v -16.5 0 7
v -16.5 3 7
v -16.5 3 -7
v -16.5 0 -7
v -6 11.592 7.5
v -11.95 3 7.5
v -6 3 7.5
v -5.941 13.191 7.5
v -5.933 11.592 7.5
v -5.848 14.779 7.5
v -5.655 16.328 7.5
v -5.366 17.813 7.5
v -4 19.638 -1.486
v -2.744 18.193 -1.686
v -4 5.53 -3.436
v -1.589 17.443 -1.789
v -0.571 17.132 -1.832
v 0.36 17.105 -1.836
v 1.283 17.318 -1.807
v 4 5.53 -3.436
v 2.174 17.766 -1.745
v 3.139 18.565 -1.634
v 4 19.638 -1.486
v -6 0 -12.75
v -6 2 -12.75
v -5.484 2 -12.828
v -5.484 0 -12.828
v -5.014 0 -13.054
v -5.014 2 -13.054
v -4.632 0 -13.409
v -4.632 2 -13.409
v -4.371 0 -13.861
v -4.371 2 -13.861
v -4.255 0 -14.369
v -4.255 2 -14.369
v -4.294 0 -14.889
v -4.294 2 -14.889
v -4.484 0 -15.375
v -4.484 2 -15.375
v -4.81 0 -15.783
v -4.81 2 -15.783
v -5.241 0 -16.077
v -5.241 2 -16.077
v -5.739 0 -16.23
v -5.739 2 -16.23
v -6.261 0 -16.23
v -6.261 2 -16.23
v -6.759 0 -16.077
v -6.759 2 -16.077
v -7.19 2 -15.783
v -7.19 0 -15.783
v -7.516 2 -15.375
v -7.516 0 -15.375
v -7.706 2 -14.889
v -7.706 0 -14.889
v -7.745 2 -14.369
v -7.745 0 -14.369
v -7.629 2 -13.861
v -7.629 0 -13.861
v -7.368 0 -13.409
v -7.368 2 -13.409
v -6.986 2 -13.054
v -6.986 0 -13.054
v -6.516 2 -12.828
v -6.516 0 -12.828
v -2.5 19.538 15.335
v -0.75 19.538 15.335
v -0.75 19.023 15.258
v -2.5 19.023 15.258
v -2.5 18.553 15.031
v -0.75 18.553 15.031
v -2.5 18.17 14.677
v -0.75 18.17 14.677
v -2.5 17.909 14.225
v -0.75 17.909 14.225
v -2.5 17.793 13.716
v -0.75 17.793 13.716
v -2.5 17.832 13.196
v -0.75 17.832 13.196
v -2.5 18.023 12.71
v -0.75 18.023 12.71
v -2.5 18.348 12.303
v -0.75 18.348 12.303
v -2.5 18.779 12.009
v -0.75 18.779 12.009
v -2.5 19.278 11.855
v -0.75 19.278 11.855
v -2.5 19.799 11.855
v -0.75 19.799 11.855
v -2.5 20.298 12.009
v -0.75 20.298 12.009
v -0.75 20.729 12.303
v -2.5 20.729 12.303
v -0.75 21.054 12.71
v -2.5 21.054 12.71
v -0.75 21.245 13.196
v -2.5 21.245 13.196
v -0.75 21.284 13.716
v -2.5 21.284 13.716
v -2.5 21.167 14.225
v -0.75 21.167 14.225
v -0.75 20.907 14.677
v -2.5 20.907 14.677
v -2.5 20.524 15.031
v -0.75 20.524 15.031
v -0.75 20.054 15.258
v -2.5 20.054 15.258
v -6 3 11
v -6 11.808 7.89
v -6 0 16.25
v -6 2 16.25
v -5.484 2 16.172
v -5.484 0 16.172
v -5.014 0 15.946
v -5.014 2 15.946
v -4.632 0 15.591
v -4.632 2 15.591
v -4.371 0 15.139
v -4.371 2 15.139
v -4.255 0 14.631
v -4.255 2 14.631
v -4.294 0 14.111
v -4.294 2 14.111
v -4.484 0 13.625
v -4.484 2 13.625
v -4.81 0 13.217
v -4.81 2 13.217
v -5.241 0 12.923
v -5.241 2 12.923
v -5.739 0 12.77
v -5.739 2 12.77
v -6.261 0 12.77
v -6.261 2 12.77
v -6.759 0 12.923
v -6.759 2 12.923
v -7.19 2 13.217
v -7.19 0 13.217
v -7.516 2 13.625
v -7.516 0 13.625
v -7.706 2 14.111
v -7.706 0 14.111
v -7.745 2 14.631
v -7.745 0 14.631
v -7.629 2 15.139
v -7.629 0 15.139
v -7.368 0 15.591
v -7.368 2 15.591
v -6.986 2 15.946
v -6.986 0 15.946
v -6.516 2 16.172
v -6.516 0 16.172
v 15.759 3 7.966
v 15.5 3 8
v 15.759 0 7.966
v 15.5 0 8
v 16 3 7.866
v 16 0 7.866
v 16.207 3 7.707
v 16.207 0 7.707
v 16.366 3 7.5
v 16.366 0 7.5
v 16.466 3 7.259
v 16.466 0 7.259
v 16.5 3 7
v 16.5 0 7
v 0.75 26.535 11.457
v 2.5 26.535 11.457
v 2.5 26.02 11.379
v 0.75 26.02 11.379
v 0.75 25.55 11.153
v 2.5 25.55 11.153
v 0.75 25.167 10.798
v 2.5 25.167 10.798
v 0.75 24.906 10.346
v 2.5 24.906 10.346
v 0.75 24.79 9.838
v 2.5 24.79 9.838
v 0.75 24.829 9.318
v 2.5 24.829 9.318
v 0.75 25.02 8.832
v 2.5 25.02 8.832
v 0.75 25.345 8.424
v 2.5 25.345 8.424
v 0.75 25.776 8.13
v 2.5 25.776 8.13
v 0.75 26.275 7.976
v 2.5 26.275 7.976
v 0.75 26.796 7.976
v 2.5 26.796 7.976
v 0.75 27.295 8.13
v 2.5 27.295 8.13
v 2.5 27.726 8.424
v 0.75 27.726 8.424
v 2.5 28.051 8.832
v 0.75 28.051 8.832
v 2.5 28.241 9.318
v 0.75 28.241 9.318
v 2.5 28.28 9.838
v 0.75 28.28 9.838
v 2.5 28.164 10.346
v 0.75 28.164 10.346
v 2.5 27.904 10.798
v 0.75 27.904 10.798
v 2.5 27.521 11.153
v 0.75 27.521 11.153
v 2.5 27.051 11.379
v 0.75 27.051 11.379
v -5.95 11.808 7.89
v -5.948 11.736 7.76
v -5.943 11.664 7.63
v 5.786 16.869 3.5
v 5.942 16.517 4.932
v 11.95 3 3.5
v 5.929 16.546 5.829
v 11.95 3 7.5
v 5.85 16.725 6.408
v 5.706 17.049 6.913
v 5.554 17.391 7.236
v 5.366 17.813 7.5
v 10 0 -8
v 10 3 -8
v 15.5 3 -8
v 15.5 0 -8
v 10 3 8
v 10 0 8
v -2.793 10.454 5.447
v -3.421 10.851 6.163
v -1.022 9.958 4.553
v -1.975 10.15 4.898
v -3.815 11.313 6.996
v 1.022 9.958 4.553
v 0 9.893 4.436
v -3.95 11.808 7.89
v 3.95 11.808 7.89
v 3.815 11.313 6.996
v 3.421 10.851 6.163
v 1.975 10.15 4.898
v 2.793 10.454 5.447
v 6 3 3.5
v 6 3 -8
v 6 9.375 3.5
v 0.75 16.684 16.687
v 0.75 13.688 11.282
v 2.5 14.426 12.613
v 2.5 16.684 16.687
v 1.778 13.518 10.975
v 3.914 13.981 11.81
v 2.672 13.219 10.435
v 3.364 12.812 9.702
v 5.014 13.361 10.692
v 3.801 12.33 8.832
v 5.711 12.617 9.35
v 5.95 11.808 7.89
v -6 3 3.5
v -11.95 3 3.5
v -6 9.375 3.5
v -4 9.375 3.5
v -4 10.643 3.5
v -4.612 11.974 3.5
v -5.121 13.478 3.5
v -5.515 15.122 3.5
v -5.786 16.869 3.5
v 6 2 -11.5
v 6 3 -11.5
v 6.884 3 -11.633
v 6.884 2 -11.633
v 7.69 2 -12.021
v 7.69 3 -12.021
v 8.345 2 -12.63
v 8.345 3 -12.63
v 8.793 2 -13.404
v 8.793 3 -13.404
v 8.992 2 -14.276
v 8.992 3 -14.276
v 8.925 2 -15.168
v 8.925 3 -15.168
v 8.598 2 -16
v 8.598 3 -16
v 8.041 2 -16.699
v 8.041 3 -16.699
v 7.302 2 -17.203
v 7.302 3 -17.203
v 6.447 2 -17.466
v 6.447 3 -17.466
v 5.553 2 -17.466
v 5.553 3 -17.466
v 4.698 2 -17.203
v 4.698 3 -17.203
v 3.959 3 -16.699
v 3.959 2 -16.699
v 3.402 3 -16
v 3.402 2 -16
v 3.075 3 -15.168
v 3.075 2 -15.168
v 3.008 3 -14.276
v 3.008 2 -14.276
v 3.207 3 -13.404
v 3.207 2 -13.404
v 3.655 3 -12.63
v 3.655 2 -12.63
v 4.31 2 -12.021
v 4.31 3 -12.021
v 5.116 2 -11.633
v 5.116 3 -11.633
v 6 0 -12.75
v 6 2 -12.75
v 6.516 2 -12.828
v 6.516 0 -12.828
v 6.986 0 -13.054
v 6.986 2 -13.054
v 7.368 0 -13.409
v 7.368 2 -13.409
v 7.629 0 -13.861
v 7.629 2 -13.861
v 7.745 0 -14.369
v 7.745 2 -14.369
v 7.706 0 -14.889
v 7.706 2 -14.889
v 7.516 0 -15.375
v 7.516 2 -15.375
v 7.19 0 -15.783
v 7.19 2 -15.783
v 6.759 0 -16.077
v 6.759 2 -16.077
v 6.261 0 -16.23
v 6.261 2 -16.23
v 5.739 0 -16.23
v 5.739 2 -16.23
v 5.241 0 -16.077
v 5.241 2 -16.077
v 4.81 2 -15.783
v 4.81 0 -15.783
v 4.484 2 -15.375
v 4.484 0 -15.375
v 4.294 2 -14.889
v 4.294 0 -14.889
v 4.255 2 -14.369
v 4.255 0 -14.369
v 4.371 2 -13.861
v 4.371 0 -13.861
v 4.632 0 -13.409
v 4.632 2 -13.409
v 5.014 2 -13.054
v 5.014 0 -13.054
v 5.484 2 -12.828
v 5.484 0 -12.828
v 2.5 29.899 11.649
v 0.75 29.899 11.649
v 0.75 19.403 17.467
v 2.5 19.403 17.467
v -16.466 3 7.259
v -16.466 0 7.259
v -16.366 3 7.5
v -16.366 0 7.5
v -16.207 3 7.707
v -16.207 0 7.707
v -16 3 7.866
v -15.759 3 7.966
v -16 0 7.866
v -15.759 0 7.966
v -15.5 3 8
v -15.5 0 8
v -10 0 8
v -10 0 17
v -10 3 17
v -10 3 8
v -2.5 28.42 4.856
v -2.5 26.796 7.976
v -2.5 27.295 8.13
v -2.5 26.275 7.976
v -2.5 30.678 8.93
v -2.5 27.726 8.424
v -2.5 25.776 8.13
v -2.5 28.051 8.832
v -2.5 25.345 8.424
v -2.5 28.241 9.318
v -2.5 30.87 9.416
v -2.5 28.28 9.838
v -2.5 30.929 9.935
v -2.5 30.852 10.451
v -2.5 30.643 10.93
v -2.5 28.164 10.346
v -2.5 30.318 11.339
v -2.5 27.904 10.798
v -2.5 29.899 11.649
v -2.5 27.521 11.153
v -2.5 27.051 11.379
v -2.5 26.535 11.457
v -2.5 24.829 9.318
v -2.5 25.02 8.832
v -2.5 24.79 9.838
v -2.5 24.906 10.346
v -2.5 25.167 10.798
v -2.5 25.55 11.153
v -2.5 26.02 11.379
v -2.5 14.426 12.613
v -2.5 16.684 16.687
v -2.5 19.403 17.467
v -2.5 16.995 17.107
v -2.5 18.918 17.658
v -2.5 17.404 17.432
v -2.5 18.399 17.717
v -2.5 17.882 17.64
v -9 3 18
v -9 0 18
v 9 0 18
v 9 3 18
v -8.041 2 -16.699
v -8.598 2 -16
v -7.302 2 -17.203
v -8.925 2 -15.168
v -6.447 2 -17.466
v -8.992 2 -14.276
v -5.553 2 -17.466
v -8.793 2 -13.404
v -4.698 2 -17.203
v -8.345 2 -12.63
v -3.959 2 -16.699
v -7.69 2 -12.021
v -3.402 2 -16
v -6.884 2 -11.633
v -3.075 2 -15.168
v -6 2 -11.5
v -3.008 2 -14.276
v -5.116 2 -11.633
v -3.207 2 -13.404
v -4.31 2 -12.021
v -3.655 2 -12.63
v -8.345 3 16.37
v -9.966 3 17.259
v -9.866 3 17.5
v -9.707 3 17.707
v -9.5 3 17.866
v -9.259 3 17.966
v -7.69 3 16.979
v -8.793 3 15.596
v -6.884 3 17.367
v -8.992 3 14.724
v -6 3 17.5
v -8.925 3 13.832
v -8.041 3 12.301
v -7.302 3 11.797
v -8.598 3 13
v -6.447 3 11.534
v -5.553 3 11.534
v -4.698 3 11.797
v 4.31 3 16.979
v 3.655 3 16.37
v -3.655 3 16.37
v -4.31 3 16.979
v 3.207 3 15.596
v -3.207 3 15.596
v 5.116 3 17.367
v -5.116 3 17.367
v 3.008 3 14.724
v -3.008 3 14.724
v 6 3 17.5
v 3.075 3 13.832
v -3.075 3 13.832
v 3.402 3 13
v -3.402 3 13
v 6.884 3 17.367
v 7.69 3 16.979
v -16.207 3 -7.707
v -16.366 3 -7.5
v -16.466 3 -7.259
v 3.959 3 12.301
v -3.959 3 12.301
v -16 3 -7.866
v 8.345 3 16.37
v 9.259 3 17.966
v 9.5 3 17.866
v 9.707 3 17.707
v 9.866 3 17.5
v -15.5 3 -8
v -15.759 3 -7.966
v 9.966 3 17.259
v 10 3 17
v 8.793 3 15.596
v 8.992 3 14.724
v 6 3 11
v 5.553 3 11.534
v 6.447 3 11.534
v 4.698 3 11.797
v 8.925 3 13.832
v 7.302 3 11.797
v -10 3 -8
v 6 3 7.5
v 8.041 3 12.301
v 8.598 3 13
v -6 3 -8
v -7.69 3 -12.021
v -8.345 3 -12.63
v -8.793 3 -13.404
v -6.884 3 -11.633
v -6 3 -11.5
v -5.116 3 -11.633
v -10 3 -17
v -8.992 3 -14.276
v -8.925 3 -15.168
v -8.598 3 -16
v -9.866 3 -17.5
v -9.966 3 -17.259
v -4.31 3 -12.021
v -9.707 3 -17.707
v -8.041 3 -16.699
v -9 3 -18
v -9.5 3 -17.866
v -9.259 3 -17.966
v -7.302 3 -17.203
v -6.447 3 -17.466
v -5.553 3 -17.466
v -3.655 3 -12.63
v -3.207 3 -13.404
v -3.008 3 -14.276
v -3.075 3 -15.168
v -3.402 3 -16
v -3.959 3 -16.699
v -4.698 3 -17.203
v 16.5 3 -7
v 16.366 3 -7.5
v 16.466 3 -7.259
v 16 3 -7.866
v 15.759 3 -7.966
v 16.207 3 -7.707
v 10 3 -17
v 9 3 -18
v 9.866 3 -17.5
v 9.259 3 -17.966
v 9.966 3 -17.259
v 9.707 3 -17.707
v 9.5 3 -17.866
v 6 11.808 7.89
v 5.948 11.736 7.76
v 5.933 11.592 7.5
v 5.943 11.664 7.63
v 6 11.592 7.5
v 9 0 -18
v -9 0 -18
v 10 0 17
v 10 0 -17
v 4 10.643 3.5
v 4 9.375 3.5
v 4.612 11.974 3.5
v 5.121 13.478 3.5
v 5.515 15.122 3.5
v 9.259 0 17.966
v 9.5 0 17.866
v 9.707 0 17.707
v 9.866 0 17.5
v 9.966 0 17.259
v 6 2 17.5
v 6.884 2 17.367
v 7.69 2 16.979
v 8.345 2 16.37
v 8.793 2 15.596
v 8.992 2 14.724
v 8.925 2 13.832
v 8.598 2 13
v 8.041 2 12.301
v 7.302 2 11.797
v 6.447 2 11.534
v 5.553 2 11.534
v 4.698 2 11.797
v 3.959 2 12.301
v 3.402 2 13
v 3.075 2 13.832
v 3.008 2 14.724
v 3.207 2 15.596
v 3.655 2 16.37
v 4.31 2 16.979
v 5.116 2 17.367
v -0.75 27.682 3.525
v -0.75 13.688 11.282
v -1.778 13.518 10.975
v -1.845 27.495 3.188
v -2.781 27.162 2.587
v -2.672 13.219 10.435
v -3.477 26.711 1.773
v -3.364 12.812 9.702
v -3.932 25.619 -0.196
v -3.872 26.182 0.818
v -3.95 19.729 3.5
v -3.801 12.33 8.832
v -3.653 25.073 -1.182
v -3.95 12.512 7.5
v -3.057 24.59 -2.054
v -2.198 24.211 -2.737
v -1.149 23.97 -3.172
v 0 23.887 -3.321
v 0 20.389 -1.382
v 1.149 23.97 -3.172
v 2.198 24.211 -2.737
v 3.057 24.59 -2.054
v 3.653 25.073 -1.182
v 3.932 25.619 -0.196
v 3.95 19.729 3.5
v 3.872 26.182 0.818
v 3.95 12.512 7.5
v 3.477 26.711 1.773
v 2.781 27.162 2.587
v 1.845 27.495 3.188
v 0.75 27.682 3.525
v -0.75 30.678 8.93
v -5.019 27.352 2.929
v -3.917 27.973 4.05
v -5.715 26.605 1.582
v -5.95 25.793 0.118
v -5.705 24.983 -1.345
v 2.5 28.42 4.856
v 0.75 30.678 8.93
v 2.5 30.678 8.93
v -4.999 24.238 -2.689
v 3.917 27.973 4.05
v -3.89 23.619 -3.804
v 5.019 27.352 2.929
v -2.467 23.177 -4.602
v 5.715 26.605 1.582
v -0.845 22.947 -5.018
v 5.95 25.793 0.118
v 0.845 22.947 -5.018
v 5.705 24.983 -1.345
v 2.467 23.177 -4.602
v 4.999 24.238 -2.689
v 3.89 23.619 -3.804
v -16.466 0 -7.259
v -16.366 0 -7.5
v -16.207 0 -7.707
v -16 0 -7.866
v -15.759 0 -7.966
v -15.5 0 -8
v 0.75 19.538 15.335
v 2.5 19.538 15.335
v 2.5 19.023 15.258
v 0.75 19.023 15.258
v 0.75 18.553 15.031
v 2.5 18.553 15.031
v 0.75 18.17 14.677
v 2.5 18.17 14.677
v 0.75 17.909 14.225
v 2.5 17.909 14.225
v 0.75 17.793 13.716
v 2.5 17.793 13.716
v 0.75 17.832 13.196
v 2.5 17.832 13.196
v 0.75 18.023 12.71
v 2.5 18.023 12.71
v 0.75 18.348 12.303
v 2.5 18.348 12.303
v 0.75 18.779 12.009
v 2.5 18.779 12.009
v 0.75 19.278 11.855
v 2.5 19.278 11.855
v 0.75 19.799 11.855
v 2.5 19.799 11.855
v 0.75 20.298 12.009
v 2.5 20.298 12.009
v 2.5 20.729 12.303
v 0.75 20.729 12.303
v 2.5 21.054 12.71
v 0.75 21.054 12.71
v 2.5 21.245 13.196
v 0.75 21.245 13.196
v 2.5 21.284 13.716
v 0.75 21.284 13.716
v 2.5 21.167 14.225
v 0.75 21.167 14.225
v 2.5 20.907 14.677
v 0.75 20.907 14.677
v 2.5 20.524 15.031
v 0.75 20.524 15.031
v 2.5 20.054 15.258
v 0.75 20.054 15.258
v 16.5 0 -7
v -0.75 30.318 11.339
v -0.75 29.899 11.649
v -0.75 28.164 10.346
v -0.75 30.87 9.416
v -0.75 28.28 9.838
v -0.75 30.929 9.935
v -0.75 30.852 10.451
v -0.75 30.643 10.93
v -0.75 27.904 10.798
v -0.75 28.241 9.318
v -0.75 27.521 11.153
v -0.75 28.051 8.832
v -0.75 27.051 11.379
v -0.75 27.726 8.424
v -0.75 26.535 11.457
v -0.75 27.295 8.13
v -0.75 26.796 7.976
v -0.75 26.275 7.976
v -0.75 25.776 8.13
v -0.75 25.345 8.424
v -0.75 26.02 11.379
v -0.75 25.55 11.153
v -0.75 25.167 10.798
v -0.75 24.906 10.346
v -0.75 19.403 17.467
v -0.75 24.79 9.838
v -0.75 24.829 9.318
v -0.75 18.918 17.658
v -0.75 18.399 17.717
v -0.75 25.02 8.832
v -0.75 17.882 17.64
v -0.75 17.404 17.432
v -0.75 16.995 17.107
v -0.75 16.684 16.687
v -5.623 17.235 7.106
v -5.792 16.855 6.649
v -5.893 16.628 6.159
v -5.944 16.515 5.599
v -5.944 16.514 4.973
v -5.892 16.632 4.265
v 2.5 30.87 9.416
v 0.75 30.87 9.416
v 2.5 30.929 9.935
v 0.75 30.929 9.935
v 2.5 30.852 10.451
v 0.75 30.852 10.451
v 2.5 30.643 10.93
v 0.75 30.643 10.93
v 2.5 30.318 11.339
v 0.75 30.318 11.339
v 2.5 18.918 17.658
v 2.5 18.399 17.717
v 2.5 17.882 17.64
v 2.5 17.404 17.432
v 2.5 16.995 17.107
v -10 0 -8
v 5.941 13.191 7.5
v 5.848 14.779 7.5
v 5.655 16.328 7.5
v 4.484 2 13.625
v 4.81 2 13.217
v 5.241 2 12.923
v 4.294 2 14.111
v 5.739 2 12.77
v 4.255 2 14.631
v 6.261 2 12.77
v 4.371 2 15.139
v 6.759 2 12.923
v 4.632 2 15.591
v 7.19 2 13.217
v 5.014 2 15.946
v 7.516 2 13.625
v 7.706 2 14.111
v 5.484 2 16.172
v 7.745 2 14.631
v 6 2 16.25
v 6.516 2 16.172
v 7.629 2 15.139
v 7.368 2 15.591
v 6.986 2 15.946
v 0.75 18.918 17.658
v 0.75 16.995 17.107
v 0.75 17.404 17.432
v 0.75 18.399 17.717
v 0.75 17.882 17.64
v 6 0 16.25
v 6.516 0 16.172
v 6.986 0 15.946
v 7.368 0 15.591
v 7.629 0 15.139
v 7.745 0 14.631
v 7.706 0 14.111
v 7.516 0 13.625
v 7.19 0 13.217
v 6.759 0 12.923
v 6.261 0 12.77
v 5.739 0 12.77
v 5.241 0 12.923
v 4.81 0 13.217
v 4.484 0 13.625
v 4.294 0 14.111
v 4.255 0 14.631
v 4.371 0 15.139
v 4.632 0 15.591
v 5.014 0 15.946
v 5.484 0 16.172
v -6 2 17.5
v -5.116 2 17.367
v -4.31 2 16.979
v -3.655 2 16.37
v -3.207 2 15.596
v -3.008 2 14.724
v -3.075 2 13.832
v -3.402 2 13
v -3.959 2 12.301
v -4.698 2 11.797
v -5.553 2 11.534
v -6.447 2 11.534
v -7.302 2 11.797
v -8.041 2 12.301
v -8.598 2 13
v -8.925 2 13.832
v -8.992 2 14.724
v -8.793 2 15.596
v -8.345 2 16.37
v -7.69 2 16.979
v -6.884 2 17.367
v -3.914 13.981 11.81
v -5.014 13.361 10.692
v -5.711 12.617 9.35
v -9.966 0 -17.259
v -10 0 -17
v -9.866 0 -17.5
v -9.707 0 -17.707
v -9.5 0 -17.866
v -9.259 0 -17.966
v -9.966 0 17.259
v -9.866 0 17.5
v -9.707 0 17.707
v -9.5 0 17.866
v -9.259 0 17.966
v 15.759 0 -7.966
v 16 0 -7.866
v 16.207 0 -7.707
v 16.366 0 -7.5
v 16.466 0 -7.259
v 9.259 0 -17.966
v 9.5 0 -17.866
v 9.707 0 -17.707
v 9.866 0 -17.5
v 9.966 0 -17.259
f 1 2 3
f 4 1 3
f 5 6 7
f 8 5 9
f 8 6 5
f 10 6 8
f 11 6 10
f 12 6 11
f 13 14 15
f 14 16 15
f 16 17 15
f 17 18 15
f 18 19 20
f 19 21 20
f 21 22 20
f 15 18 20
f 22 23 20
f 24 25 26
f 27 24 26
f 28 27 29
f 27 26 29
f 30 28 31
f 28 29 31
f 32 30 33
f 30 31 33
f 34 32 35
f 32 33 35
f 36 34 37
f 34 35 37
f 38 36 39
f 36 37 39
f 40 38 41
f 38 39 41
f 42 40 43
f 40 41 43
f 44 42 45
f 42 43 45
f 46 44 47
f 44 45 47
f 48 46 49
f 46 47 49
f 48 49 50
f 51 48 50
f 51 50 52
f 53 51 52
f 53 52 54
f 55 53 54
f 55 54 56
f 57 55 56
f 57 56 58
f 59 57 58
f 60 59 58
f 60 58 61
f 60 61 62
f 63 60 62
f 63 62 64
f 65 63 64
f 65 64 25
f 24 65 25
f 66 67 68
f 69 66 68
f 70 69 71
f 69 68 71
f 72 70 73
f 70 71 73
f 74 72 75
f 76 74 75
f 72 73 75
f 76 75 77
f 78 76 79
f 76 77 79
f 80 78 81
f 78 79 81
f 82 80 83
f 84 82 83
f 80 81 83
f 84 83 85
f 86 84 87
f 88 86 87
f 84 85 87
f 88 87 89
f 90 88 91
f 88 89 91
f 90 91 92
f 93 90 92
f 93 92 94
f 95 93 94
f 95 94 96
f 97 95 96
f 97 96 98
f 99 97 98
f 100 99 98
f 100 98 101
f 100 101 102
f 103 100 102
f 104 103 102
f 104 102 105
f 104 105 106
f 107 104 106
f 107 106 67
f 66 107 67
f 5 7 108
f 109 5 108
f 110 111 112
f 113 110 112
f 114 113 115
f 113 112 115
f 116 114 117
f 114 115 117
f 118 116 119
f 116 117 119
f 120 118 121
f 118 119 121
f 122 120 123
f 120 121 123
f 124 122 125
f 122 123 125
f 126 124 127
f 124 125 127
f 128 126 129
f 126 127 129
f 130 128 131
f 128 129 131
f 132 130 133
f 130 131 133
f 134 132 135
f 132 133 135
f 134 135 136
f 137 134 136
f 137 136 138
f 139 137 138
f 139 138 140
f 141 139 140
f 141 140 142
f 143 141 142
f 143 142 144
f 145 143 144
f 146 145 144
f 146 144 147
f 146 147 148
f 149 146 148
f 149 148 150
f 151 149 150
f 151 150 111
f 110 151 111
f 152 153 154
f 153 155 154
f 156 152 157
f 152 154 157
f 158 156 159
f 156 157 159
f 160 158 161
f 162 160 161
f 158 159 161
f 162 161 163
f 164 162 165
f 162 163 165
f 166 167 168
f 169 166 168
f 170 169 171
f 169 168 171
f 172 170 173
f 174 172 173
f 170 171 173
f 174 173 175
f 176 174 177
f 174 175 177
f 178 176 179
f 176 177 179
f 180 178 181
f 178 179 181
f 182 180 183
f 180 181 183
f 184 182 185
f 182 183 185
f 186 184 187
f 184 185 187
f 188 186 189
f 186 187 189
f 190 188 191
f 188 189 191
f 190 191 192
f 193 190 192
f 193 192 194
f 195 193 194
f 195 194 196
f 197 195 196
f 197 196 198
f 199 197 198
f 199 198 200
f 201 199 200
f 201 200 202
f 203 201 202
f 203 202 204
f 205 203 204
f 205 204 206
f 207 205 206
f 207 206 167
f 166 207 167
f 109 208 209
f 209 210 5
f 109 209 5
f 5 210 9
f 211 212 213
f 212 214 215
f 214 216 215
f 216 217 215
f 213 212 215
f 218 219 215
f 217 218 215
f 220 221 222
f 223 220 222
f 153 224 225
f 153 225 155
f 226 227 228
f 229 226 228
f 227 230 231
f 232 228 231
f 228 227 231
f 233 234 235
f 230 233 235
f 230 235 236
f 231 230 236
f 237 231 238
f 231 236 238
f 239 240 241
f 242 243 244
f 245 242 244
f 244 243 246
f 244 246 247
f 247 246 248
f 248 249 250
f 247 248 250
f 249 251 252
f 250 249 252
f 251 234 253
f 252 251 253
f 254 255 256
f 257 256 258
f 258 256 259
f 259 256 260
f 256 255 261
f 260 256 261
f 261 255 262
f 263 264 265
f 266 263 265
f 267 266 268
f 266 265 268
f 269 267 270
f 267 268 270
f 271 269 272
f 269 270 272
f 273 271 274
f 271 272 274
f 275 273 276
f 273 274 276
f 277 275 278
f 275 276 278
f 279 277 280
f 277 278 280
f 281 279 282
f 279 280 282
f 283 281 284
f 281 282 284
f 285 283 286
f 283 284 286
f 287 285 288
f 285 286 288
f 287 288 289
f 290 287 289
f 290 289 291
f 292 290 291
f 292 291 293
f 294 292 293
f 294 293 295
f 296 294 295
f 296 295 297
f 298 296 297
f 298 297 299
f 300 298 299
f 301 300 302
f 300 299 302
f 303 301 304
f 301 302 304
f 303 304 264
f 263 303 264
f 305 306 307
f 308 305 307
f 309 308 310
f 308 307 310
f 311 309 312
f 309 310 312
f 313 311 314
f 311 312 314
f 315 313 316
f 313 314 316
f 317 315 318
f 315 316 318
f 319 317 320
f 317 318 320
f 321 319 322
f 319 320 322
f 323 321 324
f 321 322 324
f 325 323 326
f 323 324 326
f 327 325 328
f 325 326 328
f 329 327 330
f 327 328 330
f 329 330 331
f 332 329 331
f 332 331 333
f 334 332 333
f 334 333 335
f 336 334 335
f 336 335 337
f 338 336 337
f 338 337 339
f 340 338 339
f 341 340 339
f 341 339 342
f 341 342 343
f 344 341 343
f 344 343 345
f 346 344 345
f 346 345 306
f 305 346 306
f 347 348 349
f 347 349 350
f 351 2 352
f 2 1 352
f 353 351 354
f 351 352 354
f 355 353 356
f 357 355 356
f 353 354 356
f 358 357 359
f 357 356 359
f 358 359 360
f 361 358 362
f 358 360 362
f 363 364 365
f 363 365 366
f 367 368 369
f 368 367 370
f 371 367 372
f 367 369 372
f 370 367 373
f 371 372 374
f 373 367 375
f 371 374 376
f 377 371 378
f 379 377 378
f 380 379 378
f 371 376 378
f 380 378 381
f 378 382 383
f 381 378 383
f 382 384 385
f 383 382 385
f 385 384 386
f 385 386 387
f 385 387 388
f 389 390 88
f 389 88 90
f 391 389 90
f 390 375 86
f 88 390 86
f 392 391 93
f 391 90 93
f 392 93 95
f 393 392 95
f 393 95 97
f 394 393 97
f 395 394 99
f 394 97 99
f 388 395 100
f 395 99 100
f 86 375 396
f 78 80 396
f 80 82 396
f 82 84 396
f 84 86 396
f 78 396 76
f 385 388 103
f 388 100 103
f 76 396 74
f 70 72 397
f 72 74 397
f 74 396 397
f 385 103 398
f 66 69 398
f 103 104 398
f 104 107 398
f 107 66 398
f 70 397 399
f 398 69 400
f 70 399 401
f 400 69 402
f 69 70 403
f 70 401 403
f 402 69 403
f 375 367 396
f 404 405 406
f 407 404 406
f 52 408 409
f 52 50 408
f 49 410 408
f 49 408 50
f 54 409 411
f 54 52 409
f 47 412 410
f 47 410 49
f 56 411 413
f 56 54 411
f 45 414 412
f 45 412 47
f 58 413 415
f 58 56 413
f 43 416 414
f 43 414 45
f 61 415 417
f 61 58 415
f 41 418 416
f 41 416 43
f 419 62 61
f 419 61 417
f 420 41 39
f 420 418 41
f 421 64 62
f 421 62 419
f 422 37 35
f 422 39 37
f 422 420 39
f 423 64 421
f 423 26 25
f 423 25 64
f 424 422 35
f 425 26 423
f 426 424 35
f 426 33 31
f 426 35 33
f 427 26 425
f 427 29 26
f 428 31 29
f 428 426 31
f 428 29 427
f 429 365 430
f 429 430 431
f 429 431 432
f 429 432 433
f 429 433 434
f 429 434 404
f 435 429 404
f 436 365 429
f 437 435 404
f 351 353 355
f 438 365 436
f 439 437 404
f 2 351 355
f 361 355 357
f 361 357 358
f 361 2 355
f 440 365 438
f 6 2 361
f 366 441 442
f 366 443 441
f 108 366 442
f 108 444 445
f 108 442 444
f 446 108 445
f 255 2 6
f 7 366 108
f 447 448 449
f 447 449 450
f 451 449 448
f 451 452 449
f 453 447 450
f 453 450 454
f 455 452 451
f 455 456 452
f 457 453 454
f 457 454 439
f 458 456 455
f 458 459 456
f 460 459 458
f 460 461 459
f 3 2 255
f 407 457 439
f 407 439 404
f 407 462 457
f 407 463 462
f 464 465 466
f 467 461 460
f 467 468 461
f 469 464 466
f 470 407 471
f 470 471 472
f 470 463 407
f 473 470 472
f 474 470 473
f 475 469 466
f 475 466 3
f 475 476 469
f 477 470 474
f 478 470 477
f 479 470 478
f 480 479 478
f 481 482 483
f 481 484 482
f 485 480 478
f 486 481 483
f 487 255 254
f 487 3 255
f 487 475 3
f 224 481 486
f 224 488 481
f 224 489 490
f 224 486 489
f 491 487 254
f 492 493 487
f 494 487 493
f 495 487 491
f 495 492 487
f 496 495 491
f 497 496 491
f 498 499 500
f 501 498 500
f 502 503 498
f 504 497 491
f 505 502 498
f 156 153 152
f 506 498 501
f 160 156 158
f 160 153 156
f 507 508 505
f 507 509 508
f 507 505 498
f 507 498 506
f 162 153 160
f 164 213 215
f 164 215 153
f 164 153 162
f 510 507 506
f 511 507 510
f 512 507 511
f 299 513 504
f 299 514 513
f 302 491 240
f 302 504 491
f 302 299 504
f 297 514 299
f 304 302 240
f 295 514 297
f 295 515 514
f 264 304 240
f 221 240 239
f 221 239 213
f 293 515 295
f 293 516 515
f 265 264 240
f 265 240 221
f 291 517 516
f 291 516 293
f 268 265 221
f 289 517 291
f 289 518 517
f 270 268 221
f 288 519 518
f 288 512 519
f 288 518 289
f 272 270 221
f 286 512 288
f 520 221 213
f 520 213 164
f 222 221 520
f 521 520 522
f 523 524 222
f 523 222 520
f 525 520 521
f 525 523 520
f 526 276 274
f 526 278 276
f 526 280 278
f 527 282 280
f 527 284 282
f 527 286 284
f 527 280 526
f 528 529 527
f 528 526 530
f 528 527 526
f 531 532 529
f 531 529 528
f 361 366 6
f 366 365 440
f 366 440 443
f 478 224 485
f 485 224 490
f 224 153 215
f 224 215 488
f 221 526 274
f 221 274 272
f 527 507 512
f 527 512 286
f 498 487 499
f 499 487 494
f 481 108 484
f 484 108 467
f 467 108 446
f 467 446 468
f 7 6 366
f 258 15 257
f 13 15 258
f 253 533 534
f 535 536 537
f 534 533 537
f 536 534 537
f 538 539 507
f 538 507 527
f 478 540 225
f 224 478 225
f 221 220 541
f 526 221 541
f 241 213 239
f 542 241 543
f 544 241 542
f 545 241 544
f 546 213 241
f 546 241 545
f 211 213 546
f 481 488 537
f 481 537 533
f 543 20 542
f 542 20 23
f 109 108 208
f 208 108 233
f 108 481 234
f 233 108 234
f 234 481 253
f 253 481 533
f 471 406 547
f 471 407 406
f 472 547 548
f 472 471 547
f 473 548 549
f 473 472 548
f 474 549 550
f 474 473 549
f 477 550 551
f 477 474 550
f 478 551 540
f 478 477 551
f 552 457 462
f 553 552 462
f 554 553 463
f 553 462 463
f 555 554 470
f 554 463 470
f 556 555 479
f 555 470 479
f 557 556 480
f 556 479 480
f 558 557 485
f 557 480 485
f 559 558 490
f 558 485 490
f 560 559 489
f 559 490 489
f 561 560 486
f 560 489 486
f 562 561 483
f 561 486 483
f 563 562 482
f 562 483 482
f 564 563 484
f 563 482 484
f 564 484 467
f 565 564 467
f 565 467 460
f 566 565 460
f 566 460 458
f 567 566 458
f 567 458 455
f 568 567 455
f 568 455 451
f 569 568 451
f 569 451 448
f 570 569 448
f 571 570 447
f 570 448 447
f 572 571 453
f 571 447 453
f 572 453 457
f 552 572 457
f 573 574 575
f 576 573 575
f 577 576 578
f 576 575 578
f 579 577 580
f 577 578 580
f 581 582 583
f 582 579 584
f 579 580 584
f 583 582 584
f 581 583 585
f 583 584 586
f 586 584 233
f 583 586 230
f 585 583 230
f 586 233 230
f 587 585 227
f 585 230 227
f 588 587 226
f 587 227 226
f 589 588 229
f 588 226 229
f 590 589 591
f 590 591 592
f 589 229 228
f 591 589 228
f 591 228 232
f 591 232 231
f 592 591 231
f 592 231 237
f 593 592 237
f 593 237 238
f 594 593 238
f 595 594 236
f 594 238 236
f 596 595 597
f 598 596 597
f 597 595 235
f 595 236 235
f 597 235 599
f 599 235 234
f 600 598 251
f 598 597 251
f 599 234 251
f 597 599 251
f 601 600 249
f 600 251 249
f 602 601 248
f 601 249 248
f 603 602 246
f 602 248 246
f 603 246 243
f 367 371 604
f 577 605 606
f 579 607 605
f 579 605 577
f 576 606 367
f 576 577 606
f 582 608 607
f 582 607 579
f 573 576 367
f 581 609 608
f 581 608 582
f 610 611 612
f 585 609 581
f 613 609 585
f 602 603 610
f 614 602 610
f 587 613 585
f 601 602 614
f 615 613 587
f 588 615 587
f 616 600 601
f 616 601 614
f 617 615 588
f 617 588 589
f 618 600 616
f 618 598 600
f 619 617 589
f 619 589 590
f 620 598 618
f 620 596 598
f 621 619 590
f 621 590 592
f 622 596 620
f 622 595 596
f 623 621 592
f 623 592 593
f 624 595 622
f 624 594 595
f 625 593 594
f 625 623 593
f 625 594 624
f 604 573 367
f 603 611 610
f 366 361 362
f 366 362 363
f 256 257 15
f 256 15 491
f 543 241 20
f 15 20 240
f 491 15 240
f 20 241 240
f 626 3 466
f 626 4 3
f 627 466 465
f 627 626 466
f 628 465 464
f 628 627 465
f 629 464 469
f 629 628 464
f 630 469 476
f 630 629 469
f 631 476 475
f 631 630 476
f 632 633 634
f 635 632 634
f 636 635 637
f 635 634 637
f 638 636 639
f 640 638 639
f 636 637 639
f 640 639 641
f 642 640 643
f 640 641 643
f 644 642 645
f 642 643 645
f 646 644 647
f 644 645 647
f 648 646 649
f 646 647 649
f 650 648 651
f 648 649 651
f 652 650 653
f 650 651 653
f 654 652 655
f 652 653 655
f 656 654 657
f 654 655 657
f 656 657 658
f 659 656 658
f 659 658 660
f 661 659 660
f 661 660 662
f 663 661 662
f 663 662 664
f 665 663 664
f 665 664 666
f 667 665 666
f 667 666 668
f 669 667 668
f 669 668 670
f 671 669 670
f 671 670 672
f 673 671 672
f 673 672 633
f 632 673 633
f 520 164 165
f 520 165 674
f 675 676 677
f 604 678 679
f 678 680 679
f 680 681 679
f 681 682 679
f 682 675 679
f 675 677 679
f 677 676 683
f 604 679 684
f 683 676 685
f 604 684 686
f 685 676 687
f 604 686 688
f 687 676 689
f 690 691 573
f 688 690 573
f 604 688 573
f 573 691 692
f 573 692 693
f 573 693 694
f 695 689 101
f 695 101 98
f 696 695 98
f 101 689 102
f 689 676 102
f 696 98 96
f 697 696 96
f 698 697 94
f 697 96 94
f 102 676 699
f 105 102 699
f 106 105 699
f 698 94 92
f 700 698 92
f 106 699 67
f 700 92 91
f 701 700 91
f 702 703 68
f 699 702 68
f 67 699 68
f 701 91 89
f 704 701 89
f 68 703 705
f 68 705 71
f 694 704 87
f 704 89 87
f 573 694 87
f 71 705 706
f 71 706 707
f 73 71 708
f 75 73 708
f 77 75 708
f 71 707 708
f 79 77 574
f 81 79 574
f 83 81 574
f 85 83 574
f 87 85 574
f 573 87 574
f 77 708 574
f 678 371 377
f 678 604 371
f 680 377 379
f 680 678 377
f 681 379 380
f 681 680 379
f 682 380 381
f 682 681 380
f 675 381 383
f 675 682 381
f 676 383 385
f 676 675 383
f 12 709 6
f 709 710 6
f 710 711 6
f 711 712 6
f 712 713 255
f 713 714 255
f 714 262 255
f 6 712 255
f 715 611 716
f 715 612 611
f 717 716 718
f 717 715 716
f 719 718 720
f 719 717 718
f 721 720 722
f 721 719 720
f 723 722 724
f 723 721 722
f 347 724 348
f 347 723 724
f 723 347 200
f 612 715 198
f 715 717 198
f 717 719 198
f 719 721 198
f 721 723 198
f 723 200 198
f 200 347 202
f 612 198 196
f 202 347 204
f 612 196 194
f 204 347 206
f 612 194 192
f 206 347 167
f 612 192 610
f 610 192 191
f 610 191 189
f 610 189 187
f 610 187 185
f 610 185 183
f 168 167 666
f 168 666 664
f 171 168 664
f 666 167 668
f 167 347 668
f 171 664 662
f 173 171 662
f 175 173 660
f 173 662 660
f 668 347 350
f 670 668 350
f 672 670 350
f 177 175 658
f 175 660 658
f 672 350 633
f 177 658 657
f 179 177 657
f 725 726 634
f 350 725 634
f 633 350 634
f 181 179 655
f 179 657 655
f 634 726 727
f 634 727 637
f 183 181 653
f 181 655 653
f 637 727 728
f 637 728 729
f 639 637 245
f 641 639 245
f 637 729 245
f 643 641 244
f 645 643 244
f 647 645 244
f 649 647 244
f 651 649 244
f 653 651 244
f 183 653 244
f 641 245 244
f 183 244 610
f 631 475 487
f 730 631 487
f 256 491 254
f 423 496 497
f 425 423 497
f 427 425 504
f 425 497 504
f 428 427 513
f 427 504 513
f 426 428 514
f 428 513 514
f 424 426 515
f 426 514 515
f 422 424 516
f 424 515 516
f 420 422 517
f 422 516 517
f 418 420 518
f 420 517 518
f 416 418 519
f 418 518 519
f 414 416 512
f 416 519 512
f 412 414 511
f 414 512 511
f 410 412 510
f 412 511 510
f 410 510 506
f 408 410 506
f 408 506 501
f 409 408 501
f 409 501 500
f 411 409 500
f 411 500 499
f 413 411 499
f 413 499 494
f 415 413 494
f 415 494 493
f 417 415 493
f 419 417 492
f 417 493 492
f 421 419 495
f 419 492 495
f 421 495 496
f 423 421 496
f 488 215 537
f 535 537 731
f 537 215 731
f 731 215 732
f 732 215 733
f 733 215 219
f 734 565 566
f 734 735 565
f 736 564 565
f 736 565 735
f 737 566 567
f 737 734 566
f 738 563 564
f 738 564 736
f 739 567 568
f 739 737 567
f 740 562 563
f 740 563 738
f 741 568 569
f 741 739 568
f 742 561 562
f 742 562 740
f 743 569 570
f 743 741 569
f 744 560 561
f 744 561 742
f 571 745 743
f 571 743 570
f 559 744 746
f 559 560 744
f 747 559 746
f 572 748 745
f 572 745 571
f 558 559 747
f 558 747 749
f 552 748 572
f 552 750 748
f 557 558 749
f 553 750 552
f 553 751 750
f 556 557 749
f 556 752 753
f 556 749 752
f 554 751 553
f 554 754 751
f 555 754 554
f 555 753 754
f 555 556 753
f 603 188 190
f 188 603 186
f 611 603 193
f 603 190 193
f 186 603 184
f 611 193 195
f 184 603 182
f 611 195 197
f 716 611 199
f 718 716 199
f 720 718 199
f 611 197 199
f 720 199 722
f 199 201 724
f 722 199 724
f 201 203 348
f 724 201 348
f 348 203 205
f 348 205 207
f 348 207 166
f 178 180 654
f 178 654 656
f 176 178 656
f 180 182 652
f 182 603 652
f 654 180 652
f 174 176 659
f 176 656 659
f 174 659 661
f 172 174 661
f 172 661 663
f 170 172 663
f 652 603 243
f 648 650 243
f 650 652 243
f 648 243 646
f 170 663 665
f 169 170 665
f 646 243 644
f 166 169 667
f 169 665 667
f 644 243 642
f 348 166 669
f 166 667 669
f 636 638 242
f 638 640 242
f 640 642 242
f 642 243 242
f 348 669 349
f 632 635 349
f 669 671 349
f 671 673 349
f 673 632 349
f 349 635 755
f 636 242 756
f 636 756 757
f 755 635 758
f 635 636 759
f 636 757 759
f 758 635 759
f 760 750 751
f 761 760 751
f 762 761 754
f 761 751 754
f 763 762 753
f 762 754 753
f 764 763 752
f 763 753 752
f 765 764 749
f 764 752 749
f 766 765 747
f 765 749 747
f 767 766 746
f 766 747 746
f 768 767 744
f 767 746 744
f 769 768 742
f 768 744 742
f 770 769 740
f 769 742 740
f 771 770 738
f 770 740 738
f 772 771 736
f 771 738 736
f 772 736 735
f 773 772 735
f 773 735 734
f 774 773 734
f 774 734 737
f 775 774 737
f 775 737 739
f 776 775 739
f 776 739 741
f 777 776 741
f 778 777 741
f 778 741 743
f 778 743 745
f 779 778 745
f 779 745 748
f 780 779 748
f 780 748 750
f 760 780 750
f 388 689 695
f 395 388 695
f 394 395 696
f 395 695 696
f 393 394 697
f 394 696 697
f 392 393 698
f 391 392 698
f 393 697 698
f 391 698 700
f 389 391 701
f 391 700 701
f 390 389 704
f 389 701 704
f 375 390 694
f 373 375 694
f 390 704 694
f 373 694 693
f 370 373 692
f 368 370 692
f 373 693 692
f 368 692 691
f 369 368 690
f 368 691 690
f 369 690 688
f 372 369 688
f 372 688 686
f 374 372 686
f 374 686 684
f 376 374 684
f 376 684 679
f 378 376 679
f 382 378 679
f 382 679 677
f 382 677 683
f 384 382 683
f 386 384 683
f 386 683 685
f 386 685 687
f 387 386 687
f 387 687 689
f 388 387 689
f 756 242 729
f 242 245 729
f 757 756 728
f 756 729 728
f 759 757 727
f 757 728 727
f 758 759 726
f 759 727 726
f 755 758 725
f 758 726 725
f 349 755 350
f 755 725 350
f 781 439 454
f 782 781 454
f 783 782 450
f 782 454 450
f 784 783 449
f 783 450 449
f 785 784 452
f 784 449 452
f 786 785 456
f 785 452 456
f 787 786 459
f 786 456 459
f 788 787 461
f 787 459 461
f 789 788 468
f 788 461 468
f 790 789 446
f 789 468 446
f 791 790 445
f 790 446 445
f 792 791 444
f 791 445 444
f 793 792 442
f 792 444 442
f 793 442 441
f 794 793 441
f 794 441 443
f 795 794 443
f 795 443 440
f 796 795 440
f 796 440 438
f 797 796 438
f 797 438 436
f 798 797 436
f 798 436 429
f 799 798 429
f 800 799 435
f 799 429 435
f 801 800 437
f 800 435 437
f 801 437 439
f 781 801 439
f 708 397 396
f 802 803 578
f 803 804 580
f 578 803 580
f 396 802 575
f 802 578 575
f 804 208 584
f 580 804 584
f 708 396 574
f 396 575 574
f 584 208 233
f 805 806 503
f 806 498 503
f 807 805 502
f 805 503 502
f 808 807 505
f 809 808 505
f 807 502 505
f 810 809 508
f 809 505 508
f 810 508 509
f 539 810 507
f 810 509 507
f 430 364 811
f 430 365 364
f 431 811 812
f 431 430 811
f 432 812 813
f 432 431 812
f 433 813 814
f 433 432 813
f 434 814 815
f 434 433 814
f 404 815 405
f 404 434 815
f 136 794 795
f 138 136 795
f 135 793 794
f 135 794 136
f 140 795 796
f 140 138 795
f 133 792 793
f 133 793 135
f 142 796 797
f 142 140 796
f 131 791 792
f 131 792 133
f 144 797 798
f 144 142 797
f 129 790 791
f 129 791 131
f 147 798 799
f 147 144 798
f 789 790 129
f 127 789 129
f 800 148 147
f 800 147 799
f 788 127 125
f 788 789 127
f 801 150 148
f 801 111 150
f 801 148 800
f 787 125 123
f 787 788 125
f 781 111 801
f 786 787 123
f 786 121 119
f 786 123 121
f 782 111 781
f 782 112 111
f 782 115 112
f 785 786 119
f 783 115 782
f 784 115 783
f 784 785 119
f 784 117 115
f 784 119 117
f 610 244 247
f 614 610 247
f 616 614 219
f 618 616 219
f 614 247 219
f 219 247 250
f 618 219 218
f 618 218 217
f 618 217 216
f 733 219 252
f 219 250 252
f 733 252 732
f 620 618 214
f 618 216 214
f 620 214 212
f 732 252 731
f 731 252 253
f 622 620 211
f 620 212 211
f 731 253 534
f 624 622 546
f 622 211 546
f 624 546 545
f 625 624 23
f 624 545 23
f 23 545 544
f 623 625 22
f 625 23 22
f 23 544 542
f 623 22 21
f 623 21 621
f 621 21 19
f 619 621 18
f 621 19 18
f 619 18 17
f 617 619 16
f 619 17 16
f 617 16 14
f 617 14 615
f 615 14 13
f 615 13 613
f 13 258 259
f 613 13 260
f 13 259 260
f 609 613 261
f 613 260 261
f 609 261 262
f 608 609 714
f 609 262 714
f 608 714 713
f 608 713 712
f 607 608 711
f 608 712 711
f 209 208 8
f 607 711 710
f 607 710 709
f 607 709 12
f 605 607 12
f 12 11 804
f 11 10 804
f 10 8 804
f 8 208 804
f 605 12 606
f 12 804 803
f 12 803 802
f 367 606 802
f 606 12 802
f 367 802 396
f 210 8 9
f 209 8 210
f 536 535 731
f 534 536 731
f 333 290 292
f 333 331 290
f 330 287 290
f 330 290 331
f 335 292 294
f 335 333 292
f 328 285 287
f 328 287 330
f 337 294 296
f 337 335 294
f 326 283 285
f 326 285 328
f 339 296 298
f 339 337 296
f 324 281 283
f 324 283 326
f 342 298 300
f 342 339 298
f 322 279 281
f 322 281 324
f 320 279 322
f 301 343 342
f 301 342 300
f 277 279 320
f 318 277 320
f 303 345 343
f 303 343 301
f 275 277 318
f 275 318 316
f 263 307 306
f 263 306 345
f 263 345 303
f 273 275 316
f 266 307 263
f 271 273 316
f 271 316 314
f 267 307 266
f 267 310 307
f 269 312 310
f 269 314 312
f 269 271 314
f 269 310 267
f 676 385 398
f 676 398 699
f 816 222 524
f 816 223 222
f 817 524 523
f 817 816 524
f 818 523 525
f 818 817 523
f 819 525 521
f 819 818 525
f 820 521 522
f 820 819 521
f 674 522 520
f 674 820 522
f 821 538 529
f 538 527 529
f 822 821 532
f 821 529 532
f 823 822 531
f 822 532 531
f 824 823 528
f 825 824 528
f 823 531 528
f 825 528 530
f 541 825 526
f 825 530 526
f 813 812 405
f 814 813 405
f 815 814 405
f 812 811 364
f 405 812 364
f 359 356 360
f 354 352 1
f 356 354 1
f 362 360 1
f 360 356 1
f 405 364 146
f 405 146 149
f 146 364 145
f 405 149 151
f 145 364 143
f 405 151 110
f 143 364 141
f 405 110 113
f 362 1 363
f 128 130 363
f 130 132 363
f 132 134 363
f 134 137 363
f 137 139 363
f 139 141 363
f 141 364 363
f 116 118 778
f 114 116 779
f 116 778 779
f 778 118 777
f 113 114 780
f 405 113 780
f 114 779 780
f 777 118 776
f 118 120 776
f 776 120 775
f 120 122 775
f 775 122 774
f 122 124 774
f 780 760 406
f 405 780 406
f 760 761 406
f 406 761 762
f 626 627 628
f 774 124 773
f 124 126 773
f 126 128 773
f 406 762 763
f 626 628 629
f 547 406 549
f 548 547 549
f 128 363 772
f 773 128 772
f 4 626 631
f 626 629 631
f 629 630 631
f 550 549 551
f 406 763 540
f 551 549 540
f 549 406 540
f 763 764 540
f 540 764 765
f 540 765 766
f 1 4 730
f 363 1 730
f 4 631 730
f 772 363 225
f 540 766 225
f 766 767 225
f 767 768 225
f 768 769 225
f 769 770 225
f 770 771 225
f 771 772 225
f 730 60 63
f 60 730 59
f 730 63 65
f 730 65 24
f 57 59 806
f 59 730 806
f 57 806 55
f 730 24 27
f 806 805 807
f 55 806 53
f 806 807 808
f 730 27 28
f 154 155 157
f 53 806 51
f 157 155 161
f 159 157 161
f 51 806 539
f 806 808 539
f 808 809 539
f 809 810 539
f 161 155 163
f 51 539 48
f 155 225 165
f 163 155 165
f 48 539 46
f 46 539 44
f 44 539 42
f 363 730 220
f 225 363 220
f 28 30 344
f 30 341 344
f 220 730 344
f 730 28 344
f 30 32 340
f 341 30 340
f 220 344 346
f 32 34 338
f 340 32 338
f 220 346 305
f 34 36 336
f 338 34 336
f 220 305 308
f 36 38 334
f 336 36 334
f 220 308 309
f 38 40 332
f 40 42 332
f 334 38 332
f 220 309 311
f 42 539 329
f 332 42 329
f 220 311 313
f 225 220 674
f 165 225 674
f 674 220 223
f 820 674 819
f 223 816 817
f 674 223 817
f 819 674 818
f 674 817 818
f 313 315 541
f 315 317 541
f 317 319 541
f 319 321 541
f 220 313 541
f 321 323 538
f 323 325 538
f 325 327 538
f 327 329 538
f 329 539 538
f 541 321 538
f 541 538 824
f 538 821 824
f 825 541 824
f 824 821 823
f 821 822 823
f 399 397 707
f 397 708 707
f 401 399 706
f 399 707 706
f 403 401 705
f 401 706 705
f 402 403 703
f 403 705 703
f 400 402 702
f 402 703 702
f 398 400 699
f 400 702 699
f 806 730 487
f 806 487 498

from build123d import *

# Parameters (mm, degrees)
SKETCH_1_W          = 20
SKETCH_1_H          = 36
EXTRUDE_1_DEPTH     = 3
SKETCH_2_W          = 33
SKETCH_2_H          = 16
EXTRUDE_2_DEPTH     = 3
EXTRUDE_4_DEPTH     = 6
EXTRUDE_6_DEPTH     = 16
EXTRUDE_7_DEPTH     = 4
SKETCH_13_R         = 1.75
CUT_EXTRUDE_4_DEPTH = 42.261436472
FILLET_3_R          = 2
FILLET_5_R          = 1
SKETCH_14_R         = 1.75
CUT_EXTRUDE_5_DEPTH = 38.098338449
SKETCH_15_R         = 3
CUT_EXTRUDE_6_DEPTH = 1
EXTRUDE_8_DEPTH     = 2


with BuildPart() as part:
    # 草图1 → 凸台-拉伸1 (new body)
    with BuildSketch(Plane(origin=(0, 0, 0), x_dir=(1, 0, 0), z_dir=(0, 1, 0))):
        Rectangle(SKETCH_1_W, SKETCH_1_H)
    extrude(amount=EXTRUDE_1_DEPTH)

    # 草图2 → 凸台-拉伸2 (add)
    with BuildSketch(Plane(origin=(0, 3, 0), x_dir=(1, 0, 0), z_dir=(0, 1, 0))):
        Rectangle(SKETCH_2_W, SKETCH_2_H)
    extrude(amount=-EXTRUDE_2_DEPTH)

    # 草图9 → 凸台-拉伸4 (add, symmetric)
    with BuildSketch(Plane(origin=(0, 0, 0), x_dir=(0, 0, -1), z_dir=(1, 0, 0))):
        Polygon((-11, 3), (-7.89033458, 11.808156288), (8, 3), align=None)
    extrude(amount=EXTRUDE_4_DEPTH, both=True)

    # 草图11 → 凸台-拉伸6 (add)
    with BuildSketch(Plane(origin=(0, 5.687071281, -3.152395087), x_dir=(1, 0, 0), z_dir=(0, 0.8746197071393988, -0.48480962024633173))):
        with BuildLine():
            Line((0.75, -24.683935623), (2.5, -24.683935623))
            Line((2.5, -24.683935623), (2.5, -18.025055397))
            ThreePointArc((2.5, -18.025055397), (0, -6.675749886), (-2.5, -18.025055397))
            Line((-2.5, -18.025055397), (-2.5, -24.683935623))
            Line((-2.5, -24.683935623), (-0.75, -24.683935623))
            Line((-0.75, -24.683935623), (-0.75, -16.503893772))
            ThreePointArc((-0.75, -16.503893772), (0, -8.675749886), (0.75, -16.503893772))
            Line((0.75, -16.503893772), (0.75, -24.683935623))
        make_face()
    extrude(amount=EXTRUDE_6_DEPTH)

    # 草图12 → 凸台-拉伸7 (add, symmetric)
    with BuildSketch(Plane(origin=(0, 0, 0), x_dir=(0, 0, -1), z_dir=(1, 0, 0))):
        Polygon((-4.435586737, 9.893158289), (1.382128706, 20.388594774), (3.435990627, 5.529871706), align=None)
    extrude(amount=EXTRUDE_7_DEPTH, both=True)

    # 草图13 → 切除-拉伸4 (cut, through all)
    with BuildSketch(Plane(origin=(2.5, 0, 0), x_dir=(0, 0, -1), z_dir=(1, 0, 0))):
        with Locations(Location((-9.706952079, 26.535372625, 0), (0, 0, 180))):
            Circle(SKETCH_13_R)
        with Locations(Location((-13.585429041, 19.538414968, 0), (0, 0, 180))):
            Circle(SKETCH_13_R)
    extrude(amount=-CUT_EXTRUDE_4_DEPTH, mode=Mode.SUBTRACT)

    # 圆角3
    fillet_3_edges = [part.edges().sort_by_distance(p)[0] for p in [
        (-1.625, 17.654080736, 18.436661458),
        (1.625, 17.654080736, 18.436661458),
        (-1.625, 31.647996051, 10.679707534),
        (1.625, 31.647996051, 10.679707534),
    ]]
    fillet(fillet_3_edges, radius=FILLET_3_R)

    # 圆角5
    fillet_5_edges = [part.edges().sort_by_distance(p)[0] for p in [
        (16.5, 1.5, 8),
        (-16.5, 1.5, -8),
        (16.5, 1.5, -8),
        (-16.5, 1.5, 8),
        (10, 1.5, 18),
        (-10, 1.5, 18),
        (-10, 1.5, -18),
        (10, 1.5, -18),
    ]]
    fillet(fillet_5_edges, radius=FILLET_5_R)

    # 草图14 → 切除-拉伸5 (cut, through all)
    with BuildSketch(Plane(origin=(0, 3, 0), x_dir=(1, 0, 0), z_dir=(0, 1, 0))):
        with Locations(Location((-6, -14.5, 0), (0, 0, 270))):
            Circle(SKETCH_14_R)
        with Locations(Location((-6, 14.5, 0), (0, 0, 270))):
            Circle(SKETCH_14_R)
        with Locations(Location((6, 14.5, 0), (0, 0, 270))):
            Circle(SKETCH_14_R)
        with Locations(Location((6, -14.5, 0), (0, 0, 270))):
            Circle(SKETCH_14_R)
    extrude(amount=-CUT_EXTRUDE_5_DEPTH, mode=Mode.SUBTRACT)

    # 草图15 → 切除-拉伸6 (cut)
    with BuildSketch(Plane(origin=(0, 3, 0), x_dir=(1, 0, 0), z_dir=(0, 1, 0))):
        with Locations(Location((6, -14.5, 0), (0, 0, 270))):
            Circle(SKETCH_15_R)
        with Locations(Location((-6, -14.5, 0), (0, 0, 270))):
            Circle(SKETCH_15_R)
        with Locations(Location((6, 14.5, 0), (0, 0, 270))):
            Circle(SKETCH_15_R)
        with Locations(Location((-6, 14.5, 0), (0, 0, 270))):
            Circle(SKETCH_15_R)
    extrude(amount=-CUT_EXTRUDE_6_DEPTH, mode=Mode.SUBTRACT)

    # 草图16 → 凸台-拉伸8 (add, symmetric)
    with BuildSketch(Plane(origin=(0, 0, 5.5), x_dir=(-1, 0, 0), z_dir=(0, 0, -1))):
        Polygon((-3.95, 21), (-11.95, 3), (-3.95, 3), align=None)
        Polygon((3.95, 3), (3.95, 21), (11.95, 3), align=None)
    extrude(amount=EXTRUDE_8_DEPTH, both=True)


solid = part.part
